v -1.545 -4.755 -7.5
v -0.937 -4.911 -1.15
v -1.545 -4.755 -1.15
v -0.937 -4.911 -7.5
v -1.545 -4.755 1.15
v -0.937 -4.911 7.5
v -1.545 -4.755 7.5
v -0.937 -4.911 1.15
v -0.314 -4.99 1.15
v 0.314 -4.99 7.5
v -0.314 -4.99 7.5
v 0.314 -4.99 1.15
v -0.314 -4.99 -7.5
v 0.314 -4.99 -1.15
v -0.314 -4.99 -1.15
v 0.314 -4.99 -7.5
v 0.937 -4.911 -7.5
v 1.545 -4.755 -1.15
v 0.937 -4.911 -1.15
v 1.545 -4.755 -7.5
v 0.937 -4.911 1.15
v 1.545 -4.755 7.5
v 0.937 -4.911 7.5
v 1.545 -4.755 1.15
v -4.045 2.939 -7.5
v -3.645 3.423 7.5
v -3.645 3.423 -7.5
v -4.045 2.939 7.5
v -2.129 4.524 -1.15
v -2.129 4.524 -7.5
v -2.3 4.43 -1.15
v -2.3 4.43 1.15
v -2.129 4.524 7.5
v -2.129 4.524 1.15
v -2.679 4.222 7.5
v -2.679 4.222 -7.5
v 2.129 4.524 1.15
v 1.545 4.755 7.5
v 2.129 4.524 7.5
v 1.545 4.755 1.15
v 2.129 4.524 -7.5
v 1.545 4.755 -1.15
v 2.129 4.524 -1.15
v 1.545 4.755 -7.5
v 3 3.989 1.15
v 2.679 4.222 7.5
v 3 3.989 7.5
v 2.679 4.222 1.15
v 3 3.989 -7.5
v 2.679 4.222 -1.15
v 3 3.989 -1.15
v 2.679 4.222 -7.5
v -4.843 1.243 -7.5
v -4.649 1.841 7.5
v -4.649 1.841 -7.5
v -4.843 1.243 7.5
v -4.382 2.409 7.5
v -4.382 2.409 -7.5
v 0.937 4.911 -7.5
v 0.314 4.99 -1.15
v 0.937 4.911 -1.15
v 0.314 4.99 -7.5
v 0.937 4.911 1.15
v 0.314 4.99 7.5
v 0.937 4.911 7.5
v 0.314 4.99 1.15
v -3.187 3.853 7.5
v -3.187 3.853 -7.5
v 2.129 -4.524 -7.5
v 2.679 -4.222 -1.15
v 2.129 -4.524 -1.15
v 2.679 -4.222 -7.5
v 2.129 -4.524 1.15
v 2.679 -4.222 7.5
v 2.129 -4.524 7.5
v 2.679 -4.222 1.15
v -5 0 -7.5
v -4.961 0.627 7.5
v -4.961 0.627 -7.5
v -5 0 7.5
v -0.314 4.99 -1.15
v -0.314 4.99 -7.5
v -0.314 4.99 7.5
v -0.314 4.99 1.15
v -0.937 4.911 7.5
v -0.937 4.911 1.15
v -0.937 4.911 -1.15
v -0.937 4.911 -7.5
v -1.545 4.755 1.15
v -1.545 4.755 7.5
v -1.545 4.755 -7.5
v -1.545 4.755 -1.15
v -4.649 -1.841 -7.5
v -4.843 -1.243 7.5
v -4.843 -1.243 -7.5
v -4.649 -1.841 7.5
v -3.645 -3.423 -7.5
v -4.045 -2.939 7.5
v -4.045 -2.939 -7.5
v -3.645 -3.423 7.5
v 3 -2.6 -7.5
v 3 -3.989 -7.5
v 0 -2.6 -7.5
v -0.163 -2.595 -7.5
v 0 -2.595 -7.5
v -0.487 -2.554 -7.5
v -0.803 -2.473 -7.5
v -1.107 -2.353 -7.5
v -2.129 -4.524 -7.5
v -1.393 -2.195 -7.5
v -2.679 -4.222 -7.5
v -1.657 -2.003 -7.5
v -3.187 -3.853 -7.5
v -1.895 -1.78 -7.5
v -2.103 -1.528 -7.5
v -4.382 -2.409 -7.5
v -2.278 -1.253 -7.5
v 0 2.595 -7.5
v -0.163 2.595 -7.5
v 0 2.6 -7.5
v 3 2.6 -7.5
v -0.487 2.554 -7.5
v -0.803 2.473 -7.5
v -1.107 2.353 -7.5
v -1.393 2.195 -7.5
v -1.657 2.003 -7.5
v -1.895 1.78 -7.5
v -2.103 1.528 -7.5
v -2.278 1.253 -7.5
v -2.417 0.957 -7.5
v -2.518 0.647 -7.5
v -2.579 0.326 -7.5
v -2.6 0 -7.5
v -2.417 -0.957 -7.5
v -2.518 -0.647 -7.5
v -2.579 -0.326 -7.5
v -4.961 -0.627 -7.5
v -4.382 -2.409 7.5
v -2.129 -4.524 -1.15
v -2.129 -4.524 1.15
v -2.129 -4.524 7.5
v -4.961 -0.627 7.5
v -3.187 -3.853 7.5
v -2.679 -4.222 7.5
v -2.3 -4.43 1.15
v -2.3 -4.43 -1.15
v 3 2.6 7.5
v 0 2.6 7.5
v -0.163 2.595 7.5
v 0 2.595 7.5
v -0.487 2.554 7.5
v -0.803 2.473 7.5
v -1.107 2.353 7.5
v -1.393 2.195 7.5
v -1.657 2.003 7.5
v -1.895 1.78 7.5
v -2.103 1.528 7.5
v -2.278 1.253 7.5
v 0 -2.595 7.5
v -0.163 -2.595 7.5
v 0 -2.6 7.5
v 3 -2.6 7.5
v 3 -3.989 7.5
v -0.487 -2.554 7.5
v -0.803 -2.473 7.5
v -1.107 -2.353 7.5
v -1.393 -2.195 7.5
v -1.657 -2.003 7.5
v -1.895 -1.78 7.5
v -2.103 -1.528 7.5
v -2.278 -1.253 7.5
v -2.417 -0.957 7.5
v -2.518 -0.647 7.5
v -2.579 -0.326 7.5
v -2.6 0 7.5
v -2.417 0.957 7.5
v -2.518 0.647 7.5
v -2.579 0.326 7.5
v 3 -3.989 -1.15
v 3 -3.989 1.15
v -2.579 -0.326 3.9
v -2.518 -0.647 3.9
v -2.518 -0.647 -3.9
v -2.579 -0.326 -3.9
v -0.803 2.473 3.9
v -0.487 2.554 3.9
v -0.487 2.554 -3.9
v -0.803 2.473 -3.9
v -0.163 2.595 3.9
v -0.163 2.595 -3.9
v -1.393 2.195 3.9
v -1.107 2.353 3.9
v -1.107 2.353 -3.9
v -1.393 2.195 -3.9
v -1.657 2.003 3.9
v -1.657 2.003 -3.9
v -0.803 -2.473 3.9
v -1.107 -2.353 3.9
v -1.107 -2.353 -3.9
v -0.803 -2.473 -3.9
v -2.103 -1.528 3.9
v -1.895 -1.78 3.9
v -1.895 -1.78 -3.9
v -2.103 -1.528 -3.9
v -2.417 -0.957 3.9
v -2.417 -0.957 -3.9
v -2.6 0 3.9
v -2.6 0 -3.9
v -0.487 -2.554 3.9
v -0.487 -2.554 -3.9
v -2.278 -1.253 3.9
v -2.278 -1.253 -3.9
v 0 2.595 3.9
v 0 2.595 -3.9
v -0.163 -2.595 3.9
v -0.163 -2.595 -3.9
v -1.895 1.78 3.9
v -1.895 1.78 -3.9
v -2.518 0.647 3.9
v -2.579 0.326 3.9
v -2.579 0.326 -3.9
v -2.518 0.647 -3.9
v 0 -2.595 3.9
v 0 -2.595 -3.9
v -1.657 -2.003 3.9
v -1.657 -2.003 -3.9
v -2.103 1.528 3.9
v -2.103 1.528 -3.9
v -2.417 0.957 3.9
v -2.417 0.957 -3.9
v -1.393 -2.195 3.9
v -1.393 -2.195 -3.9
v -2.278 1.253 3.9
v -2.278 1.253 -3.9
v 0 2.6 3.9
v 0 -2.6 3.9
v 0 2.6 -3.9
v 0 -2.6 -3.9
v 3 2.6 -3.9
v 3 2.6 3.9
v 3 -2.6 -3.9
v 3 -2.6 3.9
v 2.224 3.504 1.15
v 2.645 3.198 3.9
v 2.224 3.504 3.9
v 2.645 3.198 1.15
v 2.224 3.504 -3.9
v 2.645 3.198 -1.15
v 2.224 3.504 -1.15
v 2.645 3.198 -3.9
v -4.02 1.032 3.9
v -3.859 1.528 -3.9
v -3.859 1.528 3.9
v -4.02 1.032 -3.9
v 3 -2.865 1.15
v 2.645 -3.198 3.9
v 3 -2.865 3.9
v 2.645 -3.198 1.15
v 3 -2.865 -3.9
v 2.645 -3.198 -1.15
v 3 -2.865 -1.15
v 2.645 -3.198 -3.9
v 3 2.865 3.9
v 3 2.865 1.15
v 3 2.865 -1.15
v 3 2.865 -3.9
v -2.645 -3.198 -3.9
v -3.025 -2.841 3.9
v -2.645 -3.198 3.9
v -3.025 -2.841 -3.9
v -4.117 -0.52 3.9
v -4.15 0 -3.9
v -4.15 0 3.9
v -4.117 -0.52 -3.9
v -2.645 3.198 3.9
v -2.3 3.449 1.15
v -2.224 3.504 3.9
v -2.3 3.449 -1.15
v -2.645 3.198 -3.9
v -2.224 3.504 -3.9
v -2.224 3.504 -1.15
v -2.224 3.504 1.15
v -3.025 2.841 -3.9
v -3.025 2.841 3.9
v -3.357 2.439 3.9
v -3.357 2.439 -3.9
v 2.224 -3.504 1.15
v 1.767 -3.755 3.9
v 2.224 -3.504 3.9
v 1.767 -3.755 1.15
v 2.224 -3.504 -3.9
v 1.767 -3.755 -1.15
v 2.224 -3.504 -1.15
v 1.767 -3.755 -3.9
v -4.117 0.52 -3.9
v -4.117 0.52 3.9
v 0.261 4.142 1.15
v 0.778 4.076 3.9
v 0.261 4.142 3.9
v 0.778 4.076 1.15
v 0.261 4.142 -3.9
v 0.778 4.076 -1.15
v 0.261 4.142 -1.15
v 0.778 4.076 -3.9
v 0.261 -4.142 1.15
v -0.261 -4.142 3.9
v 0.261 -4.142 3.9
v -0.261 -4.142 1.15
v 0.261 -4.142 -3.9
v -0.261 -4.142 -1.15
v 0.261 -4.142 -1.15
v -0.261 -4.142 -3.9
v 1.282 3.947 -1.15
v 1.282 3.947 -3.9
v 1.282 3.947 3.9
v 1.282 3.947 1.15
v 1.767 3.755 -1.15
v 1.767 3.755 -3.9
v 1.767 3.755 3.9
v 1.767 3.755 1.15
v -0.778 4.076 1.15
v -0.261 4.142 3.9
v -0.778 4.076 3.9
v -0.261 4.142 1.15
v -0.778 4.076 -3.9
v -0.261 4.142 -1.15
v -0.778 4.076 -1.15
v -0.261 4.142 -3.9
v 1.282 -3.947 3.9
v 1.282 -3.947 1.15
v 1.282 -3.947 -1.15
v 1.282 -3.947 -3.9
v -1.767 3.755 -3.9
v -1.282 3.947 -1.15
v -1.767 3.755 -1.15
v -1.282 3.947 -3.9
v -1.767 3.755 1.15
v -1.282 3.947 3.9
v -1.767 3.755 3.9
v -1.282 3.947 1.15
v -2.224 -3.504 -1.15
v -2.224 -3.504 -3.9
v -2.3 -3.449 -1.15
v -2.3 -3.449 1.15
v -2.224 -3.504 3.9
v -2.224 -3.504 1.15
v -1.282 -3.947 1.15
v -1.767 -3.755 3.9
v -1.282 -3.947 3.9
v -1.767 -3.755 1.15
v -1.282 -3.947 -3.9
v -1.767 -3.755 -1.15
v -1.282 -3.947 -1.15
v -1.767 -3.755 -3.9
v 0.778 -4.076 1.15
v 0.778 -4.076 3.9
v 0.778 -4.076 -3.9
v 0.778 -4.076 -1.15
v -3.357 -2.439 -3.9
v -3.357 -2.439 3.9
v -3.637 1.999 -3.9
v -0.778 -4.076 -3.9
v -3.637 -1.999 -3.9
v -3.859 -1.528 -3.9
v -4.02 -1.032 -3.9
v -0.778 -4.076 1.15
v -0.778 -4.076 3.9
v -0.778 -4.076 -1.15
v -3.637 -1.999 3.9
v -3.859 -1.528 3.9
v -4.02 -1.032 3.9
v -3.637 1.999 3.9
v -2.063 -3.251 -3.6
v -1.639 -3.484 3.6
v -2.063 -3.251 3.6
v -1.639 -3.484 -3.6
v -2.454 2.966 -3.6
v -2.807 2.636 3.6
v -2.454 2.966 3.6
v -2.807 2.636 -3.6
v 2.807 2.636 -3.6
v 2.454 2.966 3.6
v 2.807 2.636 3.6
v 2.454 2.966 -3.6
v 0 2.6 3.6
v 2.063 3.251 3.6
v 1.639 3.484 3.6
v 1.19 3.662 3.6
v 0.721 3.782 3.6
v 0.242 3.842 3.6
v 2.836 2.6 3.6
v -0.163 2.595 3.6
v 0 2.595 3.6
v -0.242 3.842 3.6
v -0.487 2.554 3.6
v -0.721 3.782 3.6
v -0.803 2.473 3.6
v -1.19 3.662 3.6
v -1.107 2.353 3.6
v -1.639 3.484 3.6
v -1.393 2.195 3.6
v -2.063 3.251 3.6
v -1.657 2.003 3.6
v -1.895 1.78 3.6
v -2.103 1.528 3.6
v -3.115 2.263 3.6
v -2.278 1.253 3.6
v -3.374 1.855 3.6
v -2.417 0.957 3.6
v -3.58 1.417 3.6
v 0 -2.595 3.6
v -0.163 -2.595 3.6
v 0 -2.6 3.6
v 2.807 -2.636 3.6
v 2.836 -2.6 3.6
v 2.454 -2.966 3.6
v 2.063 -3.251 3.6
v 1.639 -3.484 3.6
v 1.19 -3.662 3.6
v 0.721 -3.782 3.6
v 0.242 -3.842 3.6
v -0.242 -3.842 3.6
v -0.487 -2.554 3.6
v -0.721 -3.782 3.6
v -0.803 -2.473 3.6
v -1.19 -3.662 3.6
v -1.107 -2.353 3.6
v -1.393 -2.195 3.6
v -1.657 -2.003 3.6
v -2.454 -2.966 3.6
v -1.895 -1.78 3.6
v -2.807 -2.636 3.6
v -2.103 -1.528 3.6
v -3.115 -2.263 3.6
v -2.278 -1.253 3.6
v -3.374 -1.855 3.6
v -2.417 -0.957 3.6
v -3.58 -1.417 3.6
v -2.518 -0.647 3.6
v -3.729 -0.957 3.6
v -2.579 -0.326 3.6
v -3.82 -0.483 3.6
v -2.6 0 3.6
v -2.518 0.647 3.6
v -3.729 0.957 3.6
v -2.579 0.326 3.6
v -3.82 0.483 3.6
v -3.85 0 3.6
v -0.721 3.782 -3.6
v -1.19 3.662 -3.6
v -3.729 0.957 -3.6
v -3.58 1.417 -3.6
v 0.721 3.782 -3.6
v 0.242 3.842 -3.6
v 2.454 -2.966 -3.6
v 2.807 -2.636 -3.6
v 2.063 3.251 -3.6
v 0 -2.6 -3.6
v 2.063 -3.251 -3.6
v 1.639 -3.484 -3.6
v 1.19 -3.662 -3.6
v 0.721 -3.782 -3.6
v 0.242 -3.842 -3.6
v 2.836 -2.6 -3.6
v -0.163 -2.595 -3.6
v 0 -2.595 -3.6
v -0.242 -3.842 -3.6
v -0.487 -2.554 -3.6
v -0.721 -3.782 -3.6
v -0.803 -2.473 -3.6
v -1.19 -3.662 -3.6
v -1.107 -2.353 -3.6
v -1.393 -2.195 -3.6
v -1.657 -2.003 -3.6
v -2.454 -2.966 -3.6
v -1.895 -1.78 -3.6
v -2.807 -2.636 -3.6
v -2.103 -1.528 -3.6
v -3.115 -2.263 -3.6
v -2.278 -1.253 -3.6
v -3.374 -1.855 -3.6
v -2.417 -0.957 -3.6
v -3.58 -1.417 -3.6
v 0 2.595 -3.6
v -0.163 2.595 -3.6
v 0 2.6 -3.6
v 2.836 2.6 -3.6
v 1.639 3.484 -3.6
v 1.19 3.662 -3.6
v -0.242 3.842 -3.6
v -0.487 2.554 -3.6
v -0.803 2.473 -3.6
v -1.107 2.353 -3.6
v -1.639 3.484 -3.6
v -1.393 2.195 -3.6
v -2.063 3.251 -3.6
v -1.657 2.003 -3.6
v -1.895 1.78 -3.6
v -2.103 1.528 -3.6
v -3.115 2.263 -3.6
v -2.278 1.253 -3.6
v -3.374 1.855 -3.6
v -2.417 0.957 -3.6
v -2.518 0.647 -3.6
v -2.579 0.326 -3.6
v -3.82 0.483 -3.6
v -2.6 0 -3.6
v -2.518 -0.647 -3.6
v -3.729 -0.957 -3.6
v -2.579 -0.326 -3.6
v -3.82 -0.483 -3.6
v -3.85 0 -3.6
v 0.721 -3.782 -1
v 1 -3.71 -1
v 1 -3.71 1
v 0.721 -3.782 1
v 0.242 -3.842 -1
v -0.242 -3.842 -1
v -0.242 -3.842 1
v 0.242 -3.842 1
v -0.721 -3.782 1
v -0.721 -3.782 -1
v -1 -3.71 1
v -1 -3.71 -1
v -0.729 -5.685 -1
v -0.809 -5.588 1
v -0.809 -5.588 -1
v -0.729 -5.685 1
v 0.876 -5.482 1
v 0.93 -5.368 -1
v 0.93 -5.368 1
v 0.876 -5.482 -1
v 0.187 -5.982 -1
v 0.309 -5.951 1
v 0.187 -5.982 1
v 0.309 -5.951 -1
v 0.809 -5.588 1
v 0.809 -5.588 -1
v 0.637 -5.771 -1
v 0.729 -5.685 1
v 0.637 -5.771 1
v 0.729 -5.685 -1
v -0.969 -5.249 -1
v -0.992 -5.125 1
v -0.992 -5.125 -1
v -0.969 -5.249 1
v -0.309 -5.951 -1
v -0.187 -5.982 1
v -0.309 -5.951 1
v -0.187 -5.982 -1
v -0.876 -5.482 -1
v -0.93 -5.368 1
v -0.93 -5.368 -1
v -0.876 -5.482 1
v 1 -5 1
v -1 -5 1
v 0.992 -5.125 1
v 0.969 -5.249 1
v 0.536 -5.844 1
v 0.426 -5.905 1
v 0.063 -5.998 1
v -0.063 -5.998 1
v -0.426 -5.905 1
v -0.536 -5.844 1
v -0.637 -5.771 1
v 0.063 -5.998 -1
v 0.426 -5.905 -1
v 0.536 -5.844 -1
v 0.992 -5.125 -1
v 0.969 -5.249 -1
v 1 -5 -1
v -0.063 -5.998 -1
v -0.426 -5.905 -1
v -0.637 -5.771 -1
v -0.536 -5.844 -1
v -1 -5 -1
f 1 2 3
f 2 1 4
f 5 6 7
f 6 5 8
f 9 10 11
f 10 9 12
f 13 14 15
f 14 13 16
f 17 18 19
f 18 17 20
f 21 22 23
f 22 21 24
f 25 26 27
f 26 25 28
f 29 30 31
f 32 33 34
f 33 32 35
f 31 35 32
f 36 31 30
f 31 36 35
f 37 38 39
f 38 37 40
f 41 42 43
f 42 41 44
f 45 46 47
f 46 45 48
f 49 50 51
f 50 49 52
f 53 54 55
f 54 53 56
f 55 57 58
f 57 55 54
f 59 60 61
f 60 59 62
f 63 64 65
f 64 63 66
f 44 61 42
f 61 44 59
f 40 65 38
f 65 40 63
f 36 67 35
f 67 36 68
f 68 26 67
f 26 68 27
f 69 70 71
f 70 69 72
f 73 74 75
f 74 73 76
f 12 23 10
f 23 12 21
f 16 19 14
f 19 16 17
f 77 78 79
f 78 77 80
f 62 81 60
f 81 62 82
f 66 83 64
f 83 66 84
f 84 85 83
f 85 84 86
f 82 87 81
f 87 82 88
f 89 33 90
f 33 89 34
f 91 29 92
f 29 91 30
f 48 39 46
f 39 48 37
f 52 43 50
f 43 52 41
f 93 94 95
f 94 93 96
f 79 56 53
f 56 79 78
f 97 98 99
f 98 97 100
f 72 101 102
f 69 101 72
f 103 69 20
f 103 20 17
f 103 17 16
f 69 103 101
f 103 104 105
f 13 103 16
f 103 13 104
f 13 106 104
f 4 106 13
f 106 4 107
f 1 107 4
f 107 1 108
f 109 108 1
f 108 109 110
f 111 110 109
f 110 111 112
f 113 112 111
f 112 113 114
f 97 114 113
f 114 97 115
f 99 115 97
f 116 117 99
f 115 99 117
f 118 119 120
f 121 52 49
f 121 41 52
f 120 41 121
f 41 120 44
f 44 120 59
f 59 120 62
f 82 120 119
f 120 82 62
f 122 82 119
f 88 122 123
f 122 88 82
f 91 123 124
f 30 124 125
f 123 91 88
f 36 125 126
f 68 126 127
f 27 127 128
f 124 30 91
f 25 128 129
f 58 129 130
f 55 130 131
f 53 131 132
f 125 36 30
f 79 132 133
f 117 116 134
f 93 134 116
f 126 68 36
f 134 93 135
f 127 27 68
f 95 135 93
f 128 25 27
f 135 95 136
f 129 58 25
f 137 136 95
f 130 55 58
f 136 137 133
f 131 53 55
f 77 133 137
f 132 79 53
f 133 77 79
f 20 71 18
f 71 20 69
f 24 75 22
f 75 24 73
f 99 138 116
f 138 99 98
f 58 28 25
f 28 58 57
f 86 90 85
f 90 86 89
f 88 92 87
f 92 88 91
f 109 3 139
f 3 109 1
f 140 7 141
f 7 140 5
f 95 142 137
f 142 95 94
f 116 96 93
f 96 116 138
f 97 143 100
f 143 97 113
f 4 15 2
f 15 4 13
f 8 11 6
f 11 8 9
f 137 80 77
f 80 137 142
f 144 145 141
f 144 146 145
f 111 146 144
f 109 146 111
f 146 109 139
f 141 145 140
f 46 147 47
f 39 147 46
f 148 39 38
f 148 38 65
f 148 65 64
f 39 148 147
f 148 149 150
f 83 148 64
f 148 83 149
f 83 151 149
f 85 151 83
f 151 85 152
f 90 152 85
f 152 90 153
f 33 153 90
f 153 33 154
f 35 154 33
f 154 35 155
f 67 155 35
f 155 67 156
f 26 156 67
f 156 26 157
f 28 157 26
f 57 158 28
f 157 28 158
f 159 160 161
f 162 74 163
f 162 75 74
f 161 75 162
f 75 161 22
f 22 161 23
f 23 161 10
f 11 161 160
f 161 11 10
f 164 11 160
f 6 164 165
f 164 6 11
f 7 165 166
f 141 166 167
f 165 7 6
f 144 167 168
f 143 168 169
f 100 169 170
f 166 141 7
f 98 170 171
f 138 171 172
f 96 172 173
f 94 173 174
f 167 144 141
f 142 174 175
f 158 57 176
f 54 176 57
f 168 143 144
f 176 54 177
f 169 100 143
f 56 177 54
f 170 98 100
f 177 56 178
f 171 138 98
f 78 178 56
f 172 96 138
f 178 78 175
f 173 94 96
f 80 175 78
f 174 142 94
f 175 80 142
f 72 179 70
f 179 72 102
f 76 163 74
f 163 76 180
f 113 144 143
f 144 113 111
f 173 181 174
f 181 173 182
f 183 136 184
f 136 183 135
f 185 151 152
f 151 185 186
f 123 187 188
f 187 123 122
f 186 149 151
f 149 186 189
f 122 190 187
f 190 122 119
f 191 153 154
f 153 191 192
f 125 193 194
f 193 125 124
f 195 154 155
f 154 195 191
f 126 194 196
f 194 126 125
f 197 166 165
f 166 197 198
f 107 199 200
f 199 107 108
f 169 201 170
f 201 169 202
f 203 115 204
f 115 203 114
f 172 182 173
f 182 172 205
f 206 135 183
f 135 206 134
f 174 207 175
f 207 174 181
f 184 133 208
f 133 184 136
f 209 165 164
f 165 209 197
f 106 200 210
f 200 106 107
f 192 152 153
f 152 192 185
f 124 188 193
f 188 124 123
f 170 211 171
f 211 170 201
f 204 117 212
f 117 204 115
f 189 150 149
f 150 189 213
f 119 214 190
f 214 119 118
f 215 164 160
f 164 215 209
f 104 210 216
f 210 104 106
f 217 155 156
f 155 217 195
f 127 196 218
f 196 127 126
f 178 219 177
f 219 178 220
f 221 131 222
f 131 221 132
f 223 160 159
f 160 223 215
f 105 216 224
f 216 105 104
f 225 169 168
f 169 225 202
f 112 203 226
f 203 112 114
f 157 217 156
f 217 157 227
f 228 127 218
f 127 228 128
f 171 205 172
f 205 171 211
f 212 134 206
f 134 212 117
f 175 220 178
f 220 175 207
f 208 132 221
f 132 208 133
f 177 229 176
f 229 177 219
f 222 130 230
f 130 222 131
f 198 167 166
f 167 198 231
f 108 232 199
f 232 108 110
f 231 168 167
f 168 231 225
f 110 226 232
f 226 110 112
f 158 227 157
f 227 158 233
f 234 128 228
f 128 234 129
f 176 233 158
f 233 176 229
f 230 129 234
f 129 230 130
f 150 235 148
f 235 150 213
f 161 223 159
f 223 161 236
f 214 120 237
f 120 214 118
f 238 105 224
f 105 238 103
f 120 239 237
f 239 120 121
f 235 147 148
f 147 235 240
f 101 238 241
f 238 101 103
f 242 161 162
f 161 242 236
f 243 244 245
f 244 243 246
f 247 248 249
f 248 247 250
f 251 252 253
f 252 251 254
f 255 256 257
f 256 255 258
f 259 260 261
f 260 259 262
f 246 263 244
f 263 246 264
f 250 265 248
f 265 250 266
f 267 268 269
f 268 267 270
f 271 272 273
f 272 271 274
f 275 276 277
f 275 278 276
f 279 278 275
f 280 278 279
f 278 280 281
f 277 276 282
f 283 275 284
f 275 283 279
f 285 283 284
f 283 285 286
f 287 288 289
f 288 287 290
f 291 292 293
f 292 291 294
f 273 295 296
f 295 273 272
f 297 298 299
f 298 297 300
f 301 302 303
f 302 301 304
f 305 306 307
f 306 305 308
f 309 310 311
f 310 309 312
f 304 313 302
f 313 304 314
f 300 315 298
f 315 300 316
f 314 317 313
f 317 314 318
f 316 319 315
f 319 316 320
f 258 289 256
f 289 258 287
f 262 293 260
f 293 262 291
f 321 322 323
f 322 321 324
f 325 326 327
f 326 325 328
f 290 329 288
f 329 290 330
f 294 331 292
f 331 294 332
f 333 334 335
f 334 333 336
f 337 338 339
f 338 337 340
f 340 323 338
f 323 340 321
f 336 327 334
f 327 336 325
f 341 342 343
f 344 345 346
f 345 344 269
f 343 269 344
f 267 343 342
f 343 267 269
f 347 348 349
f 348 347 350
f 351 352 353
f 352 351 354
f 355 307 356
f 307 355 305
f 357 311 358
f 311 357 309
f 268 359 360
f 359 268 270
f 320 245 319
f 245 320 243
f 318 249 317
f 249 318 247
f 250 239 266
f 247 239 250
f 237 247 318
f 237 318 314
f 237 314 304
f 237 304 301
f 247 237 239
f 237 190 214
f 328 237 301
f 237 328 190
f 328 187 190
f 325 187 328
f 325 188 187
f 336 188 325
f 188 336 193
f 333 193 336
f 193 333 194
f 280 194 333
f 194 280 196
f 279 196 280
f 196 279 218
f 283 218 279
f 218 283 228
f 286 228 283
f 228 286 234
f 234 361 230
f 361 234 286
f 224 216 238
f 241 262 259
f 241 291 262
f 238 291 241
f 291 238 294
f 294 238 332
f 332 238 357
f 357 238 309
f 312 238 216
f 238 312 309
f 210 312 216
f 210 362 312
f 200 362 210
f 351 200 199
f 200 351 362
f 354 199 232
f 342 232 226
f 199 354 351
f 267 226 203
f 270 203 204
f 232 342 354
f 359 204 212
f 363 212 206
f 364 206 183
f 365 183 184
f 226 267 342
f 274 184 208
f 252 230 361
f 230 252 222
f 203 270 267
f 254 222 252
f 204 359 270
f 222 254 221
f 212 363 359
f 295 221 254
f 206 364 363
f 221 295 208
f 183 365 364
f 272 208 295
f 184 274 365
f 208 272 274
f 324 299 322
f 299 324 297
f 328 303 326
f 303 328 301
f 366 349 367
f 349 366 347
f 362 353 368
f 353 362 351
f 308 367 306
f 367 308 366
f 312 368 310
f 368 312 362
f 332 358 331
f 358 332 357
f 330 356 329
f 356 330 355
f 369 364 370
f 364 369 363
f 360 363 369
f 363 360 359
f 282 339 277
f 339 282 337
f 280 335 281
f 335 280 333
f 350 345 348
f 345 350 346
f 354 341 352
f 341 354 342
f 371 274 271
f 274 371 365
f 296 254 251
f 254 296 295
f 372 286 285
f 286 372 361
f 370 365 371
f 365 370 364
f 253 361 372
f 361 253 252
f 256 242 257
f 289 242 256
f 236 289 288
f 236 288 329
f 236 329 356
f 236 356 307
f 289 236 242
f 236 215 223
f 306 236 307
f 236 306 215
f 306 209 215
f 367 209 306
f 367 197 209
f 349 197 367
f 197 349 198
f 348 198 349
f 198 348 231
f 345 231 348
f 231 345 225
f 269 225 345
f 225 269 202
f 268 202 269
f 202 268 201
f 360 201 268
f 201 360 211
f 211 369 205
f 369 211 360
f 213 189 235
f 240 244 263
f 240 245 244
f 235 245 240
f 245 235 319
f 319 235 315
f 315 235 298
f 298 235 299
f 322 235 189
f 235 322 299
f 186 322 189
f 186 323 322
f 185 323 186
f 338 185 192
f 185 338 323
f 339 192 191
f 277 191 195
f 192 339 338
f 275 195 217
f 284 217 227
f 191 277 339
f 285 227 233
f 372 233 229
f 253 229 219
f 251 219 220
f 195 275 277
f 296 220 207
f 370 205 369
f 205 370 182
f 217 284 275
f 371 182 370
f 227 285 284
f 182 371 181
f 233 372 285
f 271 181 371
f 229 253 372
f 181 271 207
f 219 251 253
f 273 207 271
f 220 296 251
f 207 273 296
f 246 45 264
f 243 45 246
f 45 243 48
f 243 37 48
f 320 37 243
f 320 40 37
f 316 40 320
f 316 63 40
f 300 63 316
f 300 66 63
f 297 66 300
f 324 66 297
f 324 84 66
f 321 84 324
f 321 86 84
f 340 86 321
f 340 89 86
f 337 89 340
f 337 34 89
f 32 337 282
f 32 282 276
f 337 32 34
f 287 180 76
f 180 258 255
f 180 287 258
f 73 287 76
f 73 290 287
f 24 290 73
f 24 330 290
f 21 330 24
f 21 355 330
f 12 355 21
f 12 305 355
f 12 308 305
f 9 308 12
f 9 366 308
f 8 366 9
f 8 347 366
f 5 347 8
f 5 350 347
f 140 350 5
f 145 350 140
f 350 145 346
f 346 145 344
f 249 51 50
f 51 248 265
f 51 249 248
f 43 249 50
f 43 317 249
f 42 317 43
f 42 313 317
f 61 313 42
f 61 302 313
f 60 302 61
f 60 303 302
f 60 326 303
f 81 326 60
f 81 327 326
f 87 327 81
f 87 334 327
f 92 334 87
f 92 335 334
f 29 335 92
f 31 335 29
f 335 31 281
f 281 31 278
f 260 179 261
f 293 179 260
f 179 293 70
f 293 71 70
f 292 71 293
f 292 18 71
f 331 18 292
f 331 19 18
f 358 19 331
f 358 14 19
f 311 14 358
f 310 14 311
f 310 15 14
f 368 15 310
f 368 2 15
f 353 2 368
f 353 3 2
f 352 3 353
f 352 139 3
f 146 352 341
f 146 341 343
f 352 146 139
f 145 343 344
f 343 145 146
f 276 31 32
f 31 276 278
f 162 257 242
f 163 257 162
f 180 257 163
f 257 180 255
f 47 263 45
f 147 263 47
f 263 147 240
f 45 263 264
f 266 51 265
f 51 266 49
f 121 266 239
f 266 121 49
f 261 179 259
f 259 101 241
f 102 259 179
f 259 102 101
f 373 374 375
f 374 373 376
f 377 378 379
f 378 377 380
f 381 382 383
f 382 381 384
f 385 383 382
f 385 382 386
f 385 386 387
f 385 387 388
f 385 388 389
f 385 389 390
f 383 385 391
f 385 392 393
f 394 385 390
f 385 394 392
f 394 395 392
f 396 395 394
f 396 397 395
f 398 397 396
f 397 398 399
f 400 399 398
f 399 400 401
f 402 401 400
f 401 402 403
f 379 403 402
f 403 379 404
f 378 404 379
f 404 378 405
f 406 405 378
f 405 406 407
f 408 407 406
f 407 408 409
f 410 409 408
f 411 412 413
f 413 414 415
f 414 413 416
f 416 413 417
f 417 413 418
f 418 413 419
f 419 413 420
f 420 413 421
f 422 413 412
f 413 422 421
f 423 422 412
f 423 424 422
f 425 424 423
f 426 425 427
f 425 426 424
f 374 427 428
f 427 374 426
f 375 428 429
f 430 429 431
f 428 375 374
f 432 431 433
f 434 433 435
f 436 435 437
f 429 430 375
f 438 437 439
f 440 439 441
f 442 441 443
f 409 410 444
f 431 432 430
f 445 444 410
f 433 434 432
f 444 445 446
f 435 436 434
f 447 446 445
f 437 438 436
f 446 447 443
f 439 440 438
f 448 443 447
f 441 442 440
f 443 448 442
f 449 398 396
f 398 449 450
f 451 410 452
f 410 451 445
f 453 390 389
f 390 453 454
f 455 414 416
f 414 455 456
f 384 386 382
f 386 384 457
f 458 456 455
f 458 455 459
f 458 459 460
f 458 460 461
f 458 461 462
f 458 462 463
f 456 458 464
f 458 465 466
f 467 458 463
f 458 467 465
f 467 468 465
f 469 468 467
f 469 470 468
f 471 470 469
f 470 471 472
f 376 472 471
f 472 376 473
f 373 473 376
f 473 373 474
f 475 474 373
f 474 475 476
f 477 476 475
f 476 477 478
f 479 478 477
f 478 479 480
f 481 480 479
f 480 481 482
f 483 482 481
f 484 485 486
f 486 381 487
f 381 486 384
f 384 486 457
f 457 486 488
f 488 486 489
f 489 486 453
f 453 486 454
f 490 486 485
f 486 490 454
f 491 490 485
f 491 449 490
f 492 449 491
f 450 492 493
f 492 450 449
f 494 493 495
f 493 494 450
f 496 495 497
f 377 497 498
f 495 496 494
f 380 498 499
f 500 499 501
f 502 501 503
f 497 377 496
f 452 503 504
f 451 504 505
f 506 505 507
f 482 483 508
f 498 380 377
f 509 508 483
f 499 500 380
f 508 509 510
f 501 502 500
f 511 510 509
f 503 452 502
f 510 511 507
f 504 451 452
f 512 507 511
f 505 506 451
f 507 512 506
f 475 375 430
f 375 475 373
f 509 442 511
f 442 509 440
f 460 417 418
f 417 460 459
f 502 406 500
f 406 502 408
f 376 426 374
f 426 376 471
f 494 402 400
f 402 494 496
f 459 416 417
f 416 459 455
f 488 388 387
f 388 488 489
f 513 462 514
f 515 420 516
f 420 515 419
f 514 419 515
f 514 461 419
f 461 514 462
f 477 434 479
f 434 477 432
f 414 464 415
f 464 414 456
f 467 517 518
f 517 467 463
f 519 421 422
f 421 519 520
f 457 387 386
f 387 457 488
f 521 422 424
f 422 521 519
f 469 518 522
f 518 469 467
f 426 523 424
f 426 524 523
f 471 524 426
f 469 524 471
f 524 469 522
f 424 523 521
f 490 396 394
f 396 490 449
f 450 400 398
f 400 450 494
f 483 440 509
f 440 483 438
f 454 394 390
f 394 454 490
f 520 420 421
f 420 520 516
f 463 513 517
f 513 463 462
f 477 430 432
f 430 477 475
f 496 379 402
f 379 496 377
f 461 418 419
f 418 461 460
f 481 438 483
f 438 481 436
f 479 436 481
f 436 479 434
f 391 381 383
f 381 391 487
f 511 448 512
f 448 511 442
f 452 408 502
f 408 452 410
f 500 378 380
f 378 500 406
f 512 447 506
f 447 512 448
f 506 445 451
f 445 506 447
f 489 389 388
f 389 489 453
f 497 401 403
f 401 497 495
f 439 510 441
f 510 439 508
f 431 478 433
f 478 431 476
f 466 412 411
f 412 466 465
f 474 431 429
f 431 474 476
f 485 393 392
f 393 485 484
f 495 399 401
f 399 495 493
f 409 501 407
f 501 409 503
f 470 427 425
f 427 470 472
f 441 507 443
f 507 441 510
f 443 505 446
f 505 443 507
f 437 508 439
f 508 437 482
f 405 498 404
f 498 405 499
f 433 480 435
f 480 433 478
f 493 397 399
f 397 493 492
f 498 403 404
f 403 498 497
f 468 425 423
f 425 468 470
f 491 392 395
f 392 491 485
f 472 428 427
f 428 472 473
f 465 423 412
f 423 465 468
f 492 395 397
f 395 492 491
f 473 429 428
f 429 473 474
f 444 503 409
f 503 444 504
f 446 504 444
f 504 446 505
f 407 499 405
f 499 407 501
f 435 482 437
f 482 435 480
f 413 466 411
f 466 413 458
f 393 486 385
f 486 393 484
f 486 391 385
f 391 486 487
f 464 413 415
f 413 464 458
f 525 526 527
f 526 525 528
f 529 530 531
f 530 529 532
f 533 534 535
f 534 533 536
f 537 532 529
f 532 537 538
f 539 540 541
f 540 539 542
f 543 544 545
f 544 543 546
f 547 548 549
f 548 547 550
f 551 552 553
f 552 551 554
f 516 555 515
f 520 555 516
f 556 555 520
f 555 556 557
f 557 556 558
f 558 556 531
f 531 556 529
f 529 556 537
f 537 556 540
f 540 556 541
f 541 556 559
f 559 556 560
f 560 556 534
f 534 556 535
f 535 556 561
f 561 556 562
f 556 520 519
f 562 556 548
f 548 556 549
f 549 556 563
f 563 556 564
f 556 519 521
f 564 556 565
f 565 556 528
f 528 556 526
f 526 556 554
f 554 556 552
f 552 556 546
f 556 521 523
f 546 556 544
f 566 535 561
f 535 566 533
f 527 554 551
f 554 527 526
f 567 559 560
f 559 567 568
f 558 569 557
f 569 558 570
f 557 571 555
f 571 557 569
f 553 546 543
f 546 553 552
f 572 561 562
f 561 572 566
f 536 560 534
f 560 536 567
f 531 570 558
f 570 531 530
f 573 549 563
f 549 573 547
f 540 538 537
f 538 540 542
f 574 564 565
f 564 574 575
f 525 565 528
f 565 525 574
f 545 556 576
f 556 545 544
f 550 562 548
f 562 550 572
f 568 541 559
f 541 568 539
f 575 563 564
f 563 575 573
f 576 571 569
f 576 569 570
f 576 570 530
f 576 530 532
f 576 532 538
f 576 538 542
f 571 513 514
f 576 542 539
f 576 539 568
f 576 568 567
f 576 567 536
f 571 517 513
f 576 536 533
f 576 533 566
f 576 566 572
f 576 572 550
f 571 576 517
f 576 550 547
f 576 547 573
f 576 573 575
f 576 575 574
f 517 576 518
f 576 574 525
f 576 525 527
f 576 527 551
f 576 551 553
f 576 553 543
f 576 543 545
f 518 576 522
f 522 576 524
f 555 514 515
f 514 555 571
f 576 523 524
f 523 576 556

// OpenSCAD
$fn=50;
innerDia=5.2;
outerDia=10;
length=15;
fudge=0.1;
spcng=0.3;
minWallThck=2;

difference(){
  slottedBead(outerDia,innerDia,length);
  slottedBead(outerDia-minWallThck+spcng,innerDia-spcng,length/2+spcng);
  translate([outerDia/2,0,0]){
    cube([outerDia+(minWallThck+spcng)*2,outerDia+fudge,minWallThck+spcng],true);
    cube([minWallThck*2,outerDia,length+fudge],true);
  }
}

rotate(0){
  slottedBead(outerDia-minWallThck-spcng,innerDia,length/2-spcng);
  translate([0,-outerDia/2,0])
    cylinder(d=minWallThck,h=minWallThck,center=true);
  translate([0,-outerDia/2+minWallThck/2,0])
    cube(minWallThck,center=true);
}



module slottedBead(outerDia,innerDia,length){
  difference(){
    cylinder(d=outerDia,h=length,center=true);
    cylinder(d=innerDia,h=length+fudge,center=true);
    translate([outerDia/2,0,0]) cube([outerDia,innerDia,length+fudge],center=true);
  }
}
